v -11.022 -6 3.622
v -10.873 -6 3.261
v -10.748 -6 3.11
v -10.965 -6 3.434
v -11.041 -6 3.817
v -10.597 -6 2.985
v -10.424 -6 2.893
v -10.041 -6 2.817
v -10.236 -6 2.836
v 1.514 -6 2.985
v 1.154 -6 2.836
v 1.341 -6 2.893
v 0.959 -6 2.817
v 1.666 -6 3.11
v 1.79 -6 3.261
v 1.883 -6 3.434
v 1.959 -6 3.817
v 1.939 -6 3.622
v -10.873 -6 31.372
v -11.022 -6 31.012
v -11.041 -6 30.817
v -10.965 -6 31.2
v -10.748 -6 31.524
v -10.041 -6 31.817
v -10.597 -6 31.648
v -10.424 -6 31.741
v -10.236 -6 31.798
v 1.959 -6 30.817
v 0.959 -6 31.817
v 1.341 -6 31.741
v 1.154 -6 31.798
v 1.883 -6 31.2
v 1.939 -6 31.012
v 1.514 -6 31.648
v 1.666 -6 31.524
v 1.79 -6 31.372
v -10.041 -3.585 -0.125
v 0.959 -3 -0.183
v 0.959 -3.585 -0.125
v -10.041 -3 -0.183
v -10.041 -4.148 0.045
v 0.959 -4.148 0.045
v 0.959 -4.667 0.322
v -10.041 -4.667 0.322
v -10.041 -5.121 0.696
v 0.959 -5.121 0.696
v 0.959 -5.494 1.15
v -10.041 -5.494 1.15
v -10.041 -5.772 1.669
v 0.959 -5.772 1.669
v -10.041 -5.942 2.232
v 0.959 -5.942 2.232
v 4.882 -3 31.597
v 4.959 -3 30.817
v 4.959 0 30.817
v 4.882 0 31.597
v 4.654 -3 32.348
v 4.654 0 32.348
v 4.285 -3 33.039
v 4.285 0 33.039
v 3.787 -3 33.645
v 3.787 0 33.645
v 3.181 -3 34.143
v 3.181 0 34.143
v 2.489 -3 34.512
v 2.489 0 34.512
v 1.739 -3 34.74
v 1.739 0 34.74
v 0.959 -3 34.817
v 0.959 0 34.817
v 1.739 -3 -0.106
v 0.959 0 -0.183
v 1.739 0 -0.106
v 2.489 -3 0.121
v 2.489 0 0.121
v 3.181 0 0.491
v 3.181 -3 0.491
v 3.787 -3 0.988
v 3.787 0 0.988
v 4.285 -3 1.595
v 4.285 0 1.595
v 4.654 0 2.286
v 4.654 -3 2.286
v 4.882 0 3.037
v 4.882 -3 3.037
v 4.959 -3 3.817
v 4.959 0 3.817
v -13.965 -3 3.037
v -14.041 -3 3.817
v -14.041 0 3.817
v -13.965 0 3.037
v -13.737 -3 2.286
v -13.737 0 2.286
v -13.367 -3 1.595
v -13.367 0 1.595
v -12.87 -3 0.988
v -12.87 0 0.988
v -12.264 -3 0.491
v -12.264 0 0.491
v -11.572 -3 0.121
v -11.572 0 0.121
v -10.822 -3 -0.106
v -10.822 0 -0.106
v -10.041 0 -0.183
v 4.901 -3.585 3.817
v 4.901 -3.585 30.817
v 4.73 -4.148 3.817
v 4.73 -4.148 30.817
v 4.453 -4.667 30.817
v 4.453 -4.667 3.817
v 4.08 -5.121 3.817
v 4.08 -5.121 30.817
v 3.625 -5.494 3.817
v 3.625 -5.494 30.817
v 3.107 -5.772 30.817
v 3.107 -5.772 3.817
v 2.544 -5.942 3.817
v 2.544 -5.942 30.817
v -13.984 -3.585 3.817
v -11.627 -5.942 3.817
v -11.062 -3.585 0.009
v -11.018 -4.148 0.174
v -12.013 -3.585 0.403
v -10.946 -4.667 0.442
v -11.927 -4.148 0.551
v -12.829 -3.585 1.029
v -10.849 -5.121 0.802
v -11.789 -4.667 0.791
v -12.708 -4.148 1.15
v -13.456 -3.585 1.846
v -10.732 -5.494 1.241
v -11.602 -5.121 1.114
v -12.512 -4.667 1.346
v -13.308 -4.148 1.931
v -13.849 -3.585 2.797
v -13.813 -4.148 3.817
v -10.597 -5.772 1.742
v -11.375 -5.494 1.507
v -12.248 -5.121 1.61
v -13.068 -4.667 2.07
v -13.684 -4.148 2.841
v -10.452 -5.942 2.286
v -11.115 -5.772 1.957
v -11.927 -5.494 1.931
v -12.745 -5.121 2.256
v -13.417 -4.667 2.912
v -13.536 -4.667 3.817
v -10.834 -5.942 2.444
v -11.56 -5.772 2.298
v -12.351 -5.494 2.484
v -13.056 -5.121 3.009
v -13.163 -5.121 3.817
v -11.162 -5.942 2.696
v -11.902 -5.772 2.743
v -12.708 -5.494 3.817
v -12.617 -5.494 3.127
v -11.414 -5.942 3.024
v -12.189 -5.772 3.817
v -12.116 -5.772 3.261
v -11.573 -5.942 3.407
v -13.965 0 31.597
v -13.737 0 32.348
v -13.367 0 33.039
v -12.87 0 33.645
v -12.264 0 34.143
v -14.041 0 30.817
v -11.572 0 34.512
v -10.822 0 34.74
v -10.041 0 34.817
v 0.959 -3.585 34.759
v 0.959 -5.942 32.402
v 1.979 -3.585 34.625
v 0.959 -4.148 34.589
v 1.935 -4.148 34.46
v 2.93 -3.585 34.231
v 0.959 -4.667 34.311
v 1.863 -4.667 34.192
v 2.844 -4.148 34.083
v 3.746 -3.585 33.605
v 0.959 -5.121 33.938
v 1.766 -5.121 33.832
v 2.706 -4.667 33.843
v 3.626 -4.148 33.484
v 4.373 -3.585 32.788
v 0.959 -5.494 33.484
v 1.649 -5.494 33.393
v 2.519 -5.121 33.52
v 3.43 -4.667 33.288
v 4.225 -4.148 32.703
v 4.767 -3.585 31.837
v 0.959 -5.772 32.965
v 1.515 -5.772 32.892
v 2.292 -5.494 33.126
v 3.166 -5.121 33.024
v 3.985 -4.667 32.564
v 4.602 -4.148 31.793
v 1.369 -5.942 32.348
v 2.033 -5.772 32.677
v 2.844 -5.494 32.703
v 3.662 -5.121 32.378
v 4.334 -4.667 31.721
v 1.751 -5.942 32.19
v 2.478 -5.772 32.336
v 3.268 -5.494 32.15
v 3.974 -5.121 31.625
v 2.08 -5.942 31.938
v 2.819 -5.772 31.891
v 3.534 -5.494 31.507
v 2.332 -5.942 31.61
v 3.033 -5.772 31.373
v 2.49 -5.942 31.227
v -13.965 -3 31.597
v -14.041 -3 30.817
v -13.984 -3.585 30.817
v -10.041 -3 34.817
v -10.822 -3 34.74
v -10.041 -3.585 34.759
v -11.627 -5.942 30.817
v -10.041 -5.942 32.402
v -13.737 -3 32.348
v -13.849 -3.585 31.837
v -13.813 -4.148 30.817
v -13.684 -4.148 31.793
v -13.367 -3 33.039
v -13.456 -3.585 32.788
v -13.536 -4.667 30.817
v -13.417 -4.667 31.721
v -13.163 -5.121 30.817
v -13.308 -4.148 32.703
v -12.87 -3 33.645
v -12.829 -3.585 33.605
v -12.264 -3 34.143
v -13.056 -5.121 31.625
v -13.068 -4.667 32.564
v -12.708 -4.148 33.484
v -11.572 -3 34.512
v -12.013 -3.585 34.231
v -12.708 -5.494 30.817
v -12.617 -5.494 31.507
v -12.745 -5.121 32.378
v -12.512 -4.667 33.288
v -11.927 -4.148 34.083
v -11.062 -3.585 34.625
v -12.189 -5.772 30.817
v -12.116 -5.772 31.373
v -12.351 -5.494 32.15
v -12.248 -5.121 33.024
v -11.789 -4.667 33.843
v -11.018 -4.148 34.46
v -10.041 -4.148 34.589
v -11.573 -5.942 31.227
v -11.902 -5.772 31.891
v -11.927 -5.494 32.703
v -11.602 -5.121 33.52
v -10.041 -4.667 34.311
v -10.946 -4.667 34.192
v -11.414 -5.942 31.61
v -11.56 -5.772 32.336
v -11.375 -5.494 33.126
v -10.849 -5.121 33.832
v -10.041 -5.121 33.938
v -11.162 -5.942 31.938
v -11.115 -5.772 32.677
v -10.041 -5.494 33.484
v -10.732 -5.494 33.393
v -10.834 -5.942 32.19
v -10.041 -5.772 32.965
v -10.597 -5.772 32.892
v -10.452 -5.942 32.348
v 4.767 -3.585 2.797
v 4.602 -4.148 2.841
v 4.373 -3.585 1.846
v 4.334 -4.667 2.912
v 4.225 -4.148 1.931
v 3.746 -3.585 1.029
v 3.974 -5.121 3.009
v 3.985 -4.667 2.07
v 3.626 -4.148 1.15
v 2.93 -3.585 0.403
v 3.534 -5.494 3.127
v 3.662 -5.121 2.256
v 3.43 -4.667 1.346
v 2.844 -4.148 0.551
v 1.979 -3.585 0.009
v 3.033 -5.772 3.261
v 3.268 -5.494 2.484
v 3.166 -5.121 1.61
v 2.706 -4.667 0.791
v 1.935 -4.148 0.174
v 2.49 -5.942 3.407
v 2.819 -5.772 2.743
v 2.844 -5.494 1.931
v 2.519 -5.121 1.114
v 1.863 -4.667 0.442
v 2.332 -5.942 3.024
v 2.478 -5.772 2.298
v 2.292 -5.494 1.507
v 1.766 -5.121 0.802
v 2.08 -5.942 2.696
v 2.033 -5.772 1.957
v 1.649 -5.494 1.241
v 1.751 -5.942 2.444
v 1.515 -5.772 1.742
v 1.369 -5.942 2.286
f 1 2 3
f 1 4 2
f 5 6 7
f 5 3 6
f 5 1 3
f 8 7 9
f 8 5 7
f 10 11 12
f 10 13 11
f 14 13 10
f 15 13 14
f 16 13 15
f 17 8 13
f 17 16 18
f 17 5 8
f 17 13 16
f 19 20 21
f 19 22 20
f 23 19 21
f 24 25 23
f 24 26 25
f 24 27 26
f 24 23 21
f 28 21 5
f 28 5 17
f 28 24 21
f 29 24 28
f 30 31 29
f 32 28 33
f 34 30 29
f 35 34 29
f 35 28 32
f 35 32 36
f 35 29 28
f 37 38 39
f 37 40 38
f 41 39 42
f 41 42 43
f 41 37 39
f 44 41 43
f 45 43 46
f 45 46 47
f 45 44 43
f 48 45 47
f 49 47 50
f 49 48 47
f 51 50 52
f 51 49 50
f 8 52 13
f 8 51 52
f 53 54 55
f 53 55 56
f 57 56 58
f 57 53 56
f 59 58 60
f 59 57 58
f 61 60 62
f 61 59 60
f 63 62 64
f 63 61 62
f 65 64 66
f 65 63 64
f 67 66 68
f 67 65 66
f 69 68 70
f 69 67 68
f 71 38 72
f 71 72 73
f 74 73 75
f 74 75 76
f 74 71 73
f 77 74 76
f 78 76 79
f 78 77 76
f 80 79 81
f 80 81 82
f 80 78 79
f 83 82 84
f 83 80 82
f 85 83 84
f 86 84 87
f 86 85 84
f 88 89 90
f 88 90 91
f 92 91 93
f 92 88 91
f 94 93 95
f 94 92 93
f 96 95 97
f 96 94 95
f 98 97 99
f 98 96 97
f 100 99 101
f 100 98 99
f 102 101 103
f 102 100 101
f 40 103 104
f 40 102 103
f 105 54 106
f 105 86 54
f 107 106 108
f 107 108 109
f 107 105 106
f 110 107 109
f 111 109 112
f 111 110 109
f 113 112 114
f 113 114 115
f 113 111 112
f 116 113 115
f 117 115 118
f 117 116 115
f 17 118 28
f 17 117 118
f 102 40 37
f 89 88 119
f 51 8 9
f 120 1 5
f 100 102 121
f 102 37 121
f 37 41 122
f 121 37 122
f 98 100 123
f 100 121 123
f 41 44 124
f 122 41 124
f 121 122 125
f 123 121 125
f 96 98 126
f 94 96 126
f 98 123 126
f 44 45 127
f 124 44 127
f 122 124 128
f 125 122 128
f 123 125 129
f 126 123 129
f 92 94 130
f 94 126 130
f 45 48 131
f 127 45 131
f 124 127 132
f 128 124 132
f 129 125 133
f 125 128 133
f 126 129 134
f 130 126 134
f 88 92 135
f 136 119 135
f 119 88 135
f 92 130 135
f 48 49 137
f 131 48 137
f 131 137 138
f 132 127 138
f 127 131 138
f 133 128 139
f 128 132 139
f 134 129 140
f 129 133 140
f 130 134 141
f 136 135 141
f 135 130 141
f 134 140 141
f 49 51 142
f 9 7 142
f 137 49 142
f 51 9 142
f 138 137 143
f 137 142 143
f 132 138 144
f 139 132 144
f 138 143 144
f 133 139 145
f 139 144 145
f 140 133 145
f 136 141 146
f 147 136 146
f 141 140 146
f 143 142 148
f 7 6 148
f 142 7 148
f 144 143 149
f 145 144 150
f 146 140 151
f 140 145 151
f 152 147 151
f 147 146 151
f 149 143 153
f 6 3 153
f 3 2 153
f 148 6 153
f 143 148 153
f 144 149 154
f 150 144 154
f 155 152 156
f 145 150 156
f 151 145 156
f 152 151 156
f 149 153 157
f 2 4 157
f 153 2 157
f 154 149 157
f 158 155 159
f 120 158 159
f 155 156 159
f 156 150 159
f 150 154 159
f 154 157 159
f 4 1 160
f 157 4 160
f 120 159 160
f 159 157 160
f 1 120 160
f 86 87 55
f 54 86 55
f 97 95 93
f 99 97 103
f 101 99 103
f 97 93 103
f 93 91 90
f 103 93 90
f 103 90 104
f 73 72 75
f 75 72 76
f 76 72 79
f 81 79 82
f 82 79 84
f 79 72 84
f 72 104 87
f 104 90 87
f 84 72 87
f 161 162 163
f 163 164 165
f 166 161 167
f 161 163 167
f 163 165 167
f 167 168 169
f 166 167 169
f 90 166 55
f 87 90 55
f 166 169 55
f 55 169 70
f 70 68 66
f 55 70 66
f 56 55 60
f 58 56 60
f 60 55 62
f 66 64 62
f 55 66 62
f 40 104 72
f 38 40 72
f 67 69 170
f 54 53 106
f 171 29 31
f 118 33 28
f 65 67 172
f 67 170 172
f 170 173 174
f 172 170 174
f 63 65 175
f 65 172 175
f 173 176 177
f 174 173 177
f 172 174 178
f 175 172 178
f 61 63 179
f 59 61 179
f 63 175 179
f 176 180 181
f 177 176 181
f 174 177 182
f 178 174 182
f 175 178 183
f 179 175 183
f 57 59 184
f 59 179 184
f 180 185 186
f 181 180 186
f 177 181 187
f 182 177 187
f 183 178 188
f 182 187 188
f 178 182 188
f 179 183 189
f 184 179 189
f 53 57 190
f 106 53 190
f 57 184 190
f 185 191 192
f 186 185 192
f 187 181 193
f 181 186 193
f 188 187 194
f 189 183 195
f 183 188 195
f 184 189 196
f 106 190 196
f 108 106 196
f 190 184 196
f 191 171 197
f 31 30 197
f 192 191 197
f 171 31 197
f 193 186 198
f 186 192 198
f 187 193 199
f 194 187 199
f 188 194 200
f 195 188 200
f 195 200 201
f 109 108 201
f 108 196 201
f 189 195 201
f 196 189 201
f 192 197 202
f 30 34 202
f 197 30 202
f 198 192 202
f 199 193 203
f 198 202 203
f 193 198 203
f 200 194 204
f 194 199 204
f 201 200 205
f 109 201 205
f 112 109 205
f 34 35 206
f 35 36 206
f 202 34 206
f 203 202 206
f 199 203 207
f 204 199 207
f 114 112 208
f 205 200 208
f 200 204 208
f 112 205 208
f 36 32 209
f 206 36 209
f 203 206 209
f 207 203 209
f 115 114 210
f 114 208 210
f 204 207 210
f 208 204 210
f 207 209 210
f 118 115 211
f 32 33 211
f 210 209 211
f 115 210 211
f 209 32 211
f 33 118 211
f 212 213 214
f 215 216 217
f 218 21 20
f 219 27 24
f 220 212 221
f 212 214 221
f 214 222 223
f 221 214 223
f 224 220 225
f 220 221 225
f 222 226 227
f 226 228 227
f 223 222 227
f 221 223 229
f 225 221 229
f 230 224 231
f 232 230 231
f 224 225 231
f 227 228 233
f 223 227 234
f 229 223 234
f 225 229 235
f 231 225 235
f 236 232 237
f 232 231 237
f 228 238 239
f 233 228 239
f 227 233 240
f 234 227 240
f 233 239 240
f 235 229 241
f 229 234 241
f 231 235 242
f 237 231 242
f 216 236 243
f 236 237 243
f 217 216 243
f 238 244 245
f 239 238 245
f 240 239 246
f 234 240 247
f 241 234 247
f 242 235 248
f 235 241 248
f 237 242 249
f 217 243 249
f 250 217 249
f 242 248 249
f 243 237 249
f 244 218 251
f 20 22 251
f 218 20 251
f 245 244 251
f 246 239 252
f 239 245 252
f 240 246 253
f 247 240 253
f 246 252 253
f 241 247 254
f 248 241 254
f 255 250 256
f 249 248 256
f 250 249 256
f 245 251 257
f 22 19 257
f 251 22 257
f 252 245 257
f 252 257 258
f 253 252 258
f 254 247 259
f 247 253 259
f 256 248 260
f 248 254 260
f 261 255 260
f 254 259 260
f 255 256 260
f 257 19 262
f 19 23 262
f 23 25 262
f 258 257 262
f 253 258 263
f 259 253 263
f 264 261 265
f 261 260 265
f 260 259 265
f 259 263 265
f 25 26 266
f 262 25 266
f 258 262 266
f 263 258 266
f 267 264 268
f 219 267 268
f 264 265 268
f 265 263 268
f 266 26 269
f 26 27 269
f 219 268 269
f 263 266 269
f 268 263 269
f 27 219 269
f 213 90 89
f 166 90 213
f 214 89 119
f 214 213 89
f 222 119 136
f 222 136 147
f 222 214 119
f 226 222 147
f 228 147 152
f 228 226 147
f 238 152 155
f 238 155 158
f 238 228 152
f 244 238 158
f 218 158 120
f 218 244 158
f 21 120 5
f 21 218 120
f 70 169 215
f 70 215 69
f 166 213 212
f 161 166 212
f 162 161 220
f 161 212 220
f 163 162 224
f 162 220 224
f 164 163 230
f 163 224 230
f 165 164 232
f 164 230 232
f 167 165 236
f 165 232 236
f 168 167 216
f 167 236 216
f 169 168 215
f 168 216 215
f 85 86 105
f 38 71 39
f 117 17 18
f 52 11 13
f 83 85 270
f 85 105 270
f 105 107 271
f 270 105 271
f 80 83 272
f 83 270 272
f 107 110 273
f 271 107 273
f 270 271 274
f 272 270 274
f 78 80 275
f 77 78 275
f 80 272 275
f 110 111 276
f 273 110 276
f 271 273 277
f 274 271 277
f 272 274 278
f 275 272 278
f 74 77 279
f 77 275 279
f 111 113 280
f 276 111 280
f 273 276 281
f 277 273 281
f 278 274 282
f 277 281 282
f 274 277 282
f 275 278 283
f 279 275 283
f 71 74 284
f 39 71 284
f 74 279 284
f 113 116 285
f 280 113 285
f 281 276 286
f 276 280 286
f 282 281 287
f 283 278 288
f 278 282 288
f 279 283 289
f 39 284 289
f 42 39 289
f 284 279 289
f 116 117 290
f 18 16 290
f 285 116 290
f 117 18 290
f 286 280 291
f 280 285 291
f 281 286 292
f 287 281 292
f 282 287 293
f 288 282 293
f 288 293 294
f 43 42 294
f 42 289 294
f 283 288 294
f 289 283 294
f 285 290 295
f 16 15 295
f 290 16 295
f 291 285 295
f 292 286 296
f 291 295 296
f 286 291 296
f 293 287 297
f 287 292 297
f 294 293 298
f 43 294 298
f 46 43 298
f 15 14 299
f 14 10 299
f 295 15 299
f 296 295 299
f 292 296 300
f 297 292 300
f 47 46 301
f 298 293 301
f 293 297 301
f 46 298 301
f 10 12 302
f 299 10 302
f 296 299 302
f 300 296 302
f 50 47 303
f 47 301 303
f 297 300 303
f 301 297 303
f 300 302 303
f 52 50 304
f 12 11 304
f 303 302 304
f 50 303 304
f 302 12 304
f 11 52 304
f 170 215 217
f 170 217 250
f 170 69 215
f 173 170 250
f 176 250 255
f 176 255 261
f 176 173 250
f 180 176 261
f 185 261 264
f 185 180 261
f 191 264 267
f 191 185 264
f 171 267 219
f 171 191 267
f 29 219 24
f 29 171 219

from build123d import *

# Parameters (mm, degrees)
F0_W     = 19
F0_H     = 35
F1_DEPTH = 6
F2_R     = 4
F3_R     = 3


with BuildPart() as f1:
    # F0 (on Front) → F1 (new body)
    with BuildSketch(Plane.XZ):
        with Locations((-4.541362, 17.316902)):
            Rectangle(F0_W, F0_H)
    extrude(amount=F1_DEPTH)

    # F2
    f2_edges = [f1.edges().sort_by_distance(p)[0] for p in [
        (4.958638, -3, 34.816902),
        (4.958638, -3, -0.183098),
        (-14.041362, -3, 34.816902),
        (-14.041362, -3, -0.183098),
    ]]
    fillet(f2_edges, radius=F2_R)

    # F3
    f3_edges = [f1.edges().sort_by_distance(p)[0] for p in [
        (-14.041362, -6, 17.316902),
    ]]
    fillet(f3_edges, radius=F3_R)


solid = f1.part
